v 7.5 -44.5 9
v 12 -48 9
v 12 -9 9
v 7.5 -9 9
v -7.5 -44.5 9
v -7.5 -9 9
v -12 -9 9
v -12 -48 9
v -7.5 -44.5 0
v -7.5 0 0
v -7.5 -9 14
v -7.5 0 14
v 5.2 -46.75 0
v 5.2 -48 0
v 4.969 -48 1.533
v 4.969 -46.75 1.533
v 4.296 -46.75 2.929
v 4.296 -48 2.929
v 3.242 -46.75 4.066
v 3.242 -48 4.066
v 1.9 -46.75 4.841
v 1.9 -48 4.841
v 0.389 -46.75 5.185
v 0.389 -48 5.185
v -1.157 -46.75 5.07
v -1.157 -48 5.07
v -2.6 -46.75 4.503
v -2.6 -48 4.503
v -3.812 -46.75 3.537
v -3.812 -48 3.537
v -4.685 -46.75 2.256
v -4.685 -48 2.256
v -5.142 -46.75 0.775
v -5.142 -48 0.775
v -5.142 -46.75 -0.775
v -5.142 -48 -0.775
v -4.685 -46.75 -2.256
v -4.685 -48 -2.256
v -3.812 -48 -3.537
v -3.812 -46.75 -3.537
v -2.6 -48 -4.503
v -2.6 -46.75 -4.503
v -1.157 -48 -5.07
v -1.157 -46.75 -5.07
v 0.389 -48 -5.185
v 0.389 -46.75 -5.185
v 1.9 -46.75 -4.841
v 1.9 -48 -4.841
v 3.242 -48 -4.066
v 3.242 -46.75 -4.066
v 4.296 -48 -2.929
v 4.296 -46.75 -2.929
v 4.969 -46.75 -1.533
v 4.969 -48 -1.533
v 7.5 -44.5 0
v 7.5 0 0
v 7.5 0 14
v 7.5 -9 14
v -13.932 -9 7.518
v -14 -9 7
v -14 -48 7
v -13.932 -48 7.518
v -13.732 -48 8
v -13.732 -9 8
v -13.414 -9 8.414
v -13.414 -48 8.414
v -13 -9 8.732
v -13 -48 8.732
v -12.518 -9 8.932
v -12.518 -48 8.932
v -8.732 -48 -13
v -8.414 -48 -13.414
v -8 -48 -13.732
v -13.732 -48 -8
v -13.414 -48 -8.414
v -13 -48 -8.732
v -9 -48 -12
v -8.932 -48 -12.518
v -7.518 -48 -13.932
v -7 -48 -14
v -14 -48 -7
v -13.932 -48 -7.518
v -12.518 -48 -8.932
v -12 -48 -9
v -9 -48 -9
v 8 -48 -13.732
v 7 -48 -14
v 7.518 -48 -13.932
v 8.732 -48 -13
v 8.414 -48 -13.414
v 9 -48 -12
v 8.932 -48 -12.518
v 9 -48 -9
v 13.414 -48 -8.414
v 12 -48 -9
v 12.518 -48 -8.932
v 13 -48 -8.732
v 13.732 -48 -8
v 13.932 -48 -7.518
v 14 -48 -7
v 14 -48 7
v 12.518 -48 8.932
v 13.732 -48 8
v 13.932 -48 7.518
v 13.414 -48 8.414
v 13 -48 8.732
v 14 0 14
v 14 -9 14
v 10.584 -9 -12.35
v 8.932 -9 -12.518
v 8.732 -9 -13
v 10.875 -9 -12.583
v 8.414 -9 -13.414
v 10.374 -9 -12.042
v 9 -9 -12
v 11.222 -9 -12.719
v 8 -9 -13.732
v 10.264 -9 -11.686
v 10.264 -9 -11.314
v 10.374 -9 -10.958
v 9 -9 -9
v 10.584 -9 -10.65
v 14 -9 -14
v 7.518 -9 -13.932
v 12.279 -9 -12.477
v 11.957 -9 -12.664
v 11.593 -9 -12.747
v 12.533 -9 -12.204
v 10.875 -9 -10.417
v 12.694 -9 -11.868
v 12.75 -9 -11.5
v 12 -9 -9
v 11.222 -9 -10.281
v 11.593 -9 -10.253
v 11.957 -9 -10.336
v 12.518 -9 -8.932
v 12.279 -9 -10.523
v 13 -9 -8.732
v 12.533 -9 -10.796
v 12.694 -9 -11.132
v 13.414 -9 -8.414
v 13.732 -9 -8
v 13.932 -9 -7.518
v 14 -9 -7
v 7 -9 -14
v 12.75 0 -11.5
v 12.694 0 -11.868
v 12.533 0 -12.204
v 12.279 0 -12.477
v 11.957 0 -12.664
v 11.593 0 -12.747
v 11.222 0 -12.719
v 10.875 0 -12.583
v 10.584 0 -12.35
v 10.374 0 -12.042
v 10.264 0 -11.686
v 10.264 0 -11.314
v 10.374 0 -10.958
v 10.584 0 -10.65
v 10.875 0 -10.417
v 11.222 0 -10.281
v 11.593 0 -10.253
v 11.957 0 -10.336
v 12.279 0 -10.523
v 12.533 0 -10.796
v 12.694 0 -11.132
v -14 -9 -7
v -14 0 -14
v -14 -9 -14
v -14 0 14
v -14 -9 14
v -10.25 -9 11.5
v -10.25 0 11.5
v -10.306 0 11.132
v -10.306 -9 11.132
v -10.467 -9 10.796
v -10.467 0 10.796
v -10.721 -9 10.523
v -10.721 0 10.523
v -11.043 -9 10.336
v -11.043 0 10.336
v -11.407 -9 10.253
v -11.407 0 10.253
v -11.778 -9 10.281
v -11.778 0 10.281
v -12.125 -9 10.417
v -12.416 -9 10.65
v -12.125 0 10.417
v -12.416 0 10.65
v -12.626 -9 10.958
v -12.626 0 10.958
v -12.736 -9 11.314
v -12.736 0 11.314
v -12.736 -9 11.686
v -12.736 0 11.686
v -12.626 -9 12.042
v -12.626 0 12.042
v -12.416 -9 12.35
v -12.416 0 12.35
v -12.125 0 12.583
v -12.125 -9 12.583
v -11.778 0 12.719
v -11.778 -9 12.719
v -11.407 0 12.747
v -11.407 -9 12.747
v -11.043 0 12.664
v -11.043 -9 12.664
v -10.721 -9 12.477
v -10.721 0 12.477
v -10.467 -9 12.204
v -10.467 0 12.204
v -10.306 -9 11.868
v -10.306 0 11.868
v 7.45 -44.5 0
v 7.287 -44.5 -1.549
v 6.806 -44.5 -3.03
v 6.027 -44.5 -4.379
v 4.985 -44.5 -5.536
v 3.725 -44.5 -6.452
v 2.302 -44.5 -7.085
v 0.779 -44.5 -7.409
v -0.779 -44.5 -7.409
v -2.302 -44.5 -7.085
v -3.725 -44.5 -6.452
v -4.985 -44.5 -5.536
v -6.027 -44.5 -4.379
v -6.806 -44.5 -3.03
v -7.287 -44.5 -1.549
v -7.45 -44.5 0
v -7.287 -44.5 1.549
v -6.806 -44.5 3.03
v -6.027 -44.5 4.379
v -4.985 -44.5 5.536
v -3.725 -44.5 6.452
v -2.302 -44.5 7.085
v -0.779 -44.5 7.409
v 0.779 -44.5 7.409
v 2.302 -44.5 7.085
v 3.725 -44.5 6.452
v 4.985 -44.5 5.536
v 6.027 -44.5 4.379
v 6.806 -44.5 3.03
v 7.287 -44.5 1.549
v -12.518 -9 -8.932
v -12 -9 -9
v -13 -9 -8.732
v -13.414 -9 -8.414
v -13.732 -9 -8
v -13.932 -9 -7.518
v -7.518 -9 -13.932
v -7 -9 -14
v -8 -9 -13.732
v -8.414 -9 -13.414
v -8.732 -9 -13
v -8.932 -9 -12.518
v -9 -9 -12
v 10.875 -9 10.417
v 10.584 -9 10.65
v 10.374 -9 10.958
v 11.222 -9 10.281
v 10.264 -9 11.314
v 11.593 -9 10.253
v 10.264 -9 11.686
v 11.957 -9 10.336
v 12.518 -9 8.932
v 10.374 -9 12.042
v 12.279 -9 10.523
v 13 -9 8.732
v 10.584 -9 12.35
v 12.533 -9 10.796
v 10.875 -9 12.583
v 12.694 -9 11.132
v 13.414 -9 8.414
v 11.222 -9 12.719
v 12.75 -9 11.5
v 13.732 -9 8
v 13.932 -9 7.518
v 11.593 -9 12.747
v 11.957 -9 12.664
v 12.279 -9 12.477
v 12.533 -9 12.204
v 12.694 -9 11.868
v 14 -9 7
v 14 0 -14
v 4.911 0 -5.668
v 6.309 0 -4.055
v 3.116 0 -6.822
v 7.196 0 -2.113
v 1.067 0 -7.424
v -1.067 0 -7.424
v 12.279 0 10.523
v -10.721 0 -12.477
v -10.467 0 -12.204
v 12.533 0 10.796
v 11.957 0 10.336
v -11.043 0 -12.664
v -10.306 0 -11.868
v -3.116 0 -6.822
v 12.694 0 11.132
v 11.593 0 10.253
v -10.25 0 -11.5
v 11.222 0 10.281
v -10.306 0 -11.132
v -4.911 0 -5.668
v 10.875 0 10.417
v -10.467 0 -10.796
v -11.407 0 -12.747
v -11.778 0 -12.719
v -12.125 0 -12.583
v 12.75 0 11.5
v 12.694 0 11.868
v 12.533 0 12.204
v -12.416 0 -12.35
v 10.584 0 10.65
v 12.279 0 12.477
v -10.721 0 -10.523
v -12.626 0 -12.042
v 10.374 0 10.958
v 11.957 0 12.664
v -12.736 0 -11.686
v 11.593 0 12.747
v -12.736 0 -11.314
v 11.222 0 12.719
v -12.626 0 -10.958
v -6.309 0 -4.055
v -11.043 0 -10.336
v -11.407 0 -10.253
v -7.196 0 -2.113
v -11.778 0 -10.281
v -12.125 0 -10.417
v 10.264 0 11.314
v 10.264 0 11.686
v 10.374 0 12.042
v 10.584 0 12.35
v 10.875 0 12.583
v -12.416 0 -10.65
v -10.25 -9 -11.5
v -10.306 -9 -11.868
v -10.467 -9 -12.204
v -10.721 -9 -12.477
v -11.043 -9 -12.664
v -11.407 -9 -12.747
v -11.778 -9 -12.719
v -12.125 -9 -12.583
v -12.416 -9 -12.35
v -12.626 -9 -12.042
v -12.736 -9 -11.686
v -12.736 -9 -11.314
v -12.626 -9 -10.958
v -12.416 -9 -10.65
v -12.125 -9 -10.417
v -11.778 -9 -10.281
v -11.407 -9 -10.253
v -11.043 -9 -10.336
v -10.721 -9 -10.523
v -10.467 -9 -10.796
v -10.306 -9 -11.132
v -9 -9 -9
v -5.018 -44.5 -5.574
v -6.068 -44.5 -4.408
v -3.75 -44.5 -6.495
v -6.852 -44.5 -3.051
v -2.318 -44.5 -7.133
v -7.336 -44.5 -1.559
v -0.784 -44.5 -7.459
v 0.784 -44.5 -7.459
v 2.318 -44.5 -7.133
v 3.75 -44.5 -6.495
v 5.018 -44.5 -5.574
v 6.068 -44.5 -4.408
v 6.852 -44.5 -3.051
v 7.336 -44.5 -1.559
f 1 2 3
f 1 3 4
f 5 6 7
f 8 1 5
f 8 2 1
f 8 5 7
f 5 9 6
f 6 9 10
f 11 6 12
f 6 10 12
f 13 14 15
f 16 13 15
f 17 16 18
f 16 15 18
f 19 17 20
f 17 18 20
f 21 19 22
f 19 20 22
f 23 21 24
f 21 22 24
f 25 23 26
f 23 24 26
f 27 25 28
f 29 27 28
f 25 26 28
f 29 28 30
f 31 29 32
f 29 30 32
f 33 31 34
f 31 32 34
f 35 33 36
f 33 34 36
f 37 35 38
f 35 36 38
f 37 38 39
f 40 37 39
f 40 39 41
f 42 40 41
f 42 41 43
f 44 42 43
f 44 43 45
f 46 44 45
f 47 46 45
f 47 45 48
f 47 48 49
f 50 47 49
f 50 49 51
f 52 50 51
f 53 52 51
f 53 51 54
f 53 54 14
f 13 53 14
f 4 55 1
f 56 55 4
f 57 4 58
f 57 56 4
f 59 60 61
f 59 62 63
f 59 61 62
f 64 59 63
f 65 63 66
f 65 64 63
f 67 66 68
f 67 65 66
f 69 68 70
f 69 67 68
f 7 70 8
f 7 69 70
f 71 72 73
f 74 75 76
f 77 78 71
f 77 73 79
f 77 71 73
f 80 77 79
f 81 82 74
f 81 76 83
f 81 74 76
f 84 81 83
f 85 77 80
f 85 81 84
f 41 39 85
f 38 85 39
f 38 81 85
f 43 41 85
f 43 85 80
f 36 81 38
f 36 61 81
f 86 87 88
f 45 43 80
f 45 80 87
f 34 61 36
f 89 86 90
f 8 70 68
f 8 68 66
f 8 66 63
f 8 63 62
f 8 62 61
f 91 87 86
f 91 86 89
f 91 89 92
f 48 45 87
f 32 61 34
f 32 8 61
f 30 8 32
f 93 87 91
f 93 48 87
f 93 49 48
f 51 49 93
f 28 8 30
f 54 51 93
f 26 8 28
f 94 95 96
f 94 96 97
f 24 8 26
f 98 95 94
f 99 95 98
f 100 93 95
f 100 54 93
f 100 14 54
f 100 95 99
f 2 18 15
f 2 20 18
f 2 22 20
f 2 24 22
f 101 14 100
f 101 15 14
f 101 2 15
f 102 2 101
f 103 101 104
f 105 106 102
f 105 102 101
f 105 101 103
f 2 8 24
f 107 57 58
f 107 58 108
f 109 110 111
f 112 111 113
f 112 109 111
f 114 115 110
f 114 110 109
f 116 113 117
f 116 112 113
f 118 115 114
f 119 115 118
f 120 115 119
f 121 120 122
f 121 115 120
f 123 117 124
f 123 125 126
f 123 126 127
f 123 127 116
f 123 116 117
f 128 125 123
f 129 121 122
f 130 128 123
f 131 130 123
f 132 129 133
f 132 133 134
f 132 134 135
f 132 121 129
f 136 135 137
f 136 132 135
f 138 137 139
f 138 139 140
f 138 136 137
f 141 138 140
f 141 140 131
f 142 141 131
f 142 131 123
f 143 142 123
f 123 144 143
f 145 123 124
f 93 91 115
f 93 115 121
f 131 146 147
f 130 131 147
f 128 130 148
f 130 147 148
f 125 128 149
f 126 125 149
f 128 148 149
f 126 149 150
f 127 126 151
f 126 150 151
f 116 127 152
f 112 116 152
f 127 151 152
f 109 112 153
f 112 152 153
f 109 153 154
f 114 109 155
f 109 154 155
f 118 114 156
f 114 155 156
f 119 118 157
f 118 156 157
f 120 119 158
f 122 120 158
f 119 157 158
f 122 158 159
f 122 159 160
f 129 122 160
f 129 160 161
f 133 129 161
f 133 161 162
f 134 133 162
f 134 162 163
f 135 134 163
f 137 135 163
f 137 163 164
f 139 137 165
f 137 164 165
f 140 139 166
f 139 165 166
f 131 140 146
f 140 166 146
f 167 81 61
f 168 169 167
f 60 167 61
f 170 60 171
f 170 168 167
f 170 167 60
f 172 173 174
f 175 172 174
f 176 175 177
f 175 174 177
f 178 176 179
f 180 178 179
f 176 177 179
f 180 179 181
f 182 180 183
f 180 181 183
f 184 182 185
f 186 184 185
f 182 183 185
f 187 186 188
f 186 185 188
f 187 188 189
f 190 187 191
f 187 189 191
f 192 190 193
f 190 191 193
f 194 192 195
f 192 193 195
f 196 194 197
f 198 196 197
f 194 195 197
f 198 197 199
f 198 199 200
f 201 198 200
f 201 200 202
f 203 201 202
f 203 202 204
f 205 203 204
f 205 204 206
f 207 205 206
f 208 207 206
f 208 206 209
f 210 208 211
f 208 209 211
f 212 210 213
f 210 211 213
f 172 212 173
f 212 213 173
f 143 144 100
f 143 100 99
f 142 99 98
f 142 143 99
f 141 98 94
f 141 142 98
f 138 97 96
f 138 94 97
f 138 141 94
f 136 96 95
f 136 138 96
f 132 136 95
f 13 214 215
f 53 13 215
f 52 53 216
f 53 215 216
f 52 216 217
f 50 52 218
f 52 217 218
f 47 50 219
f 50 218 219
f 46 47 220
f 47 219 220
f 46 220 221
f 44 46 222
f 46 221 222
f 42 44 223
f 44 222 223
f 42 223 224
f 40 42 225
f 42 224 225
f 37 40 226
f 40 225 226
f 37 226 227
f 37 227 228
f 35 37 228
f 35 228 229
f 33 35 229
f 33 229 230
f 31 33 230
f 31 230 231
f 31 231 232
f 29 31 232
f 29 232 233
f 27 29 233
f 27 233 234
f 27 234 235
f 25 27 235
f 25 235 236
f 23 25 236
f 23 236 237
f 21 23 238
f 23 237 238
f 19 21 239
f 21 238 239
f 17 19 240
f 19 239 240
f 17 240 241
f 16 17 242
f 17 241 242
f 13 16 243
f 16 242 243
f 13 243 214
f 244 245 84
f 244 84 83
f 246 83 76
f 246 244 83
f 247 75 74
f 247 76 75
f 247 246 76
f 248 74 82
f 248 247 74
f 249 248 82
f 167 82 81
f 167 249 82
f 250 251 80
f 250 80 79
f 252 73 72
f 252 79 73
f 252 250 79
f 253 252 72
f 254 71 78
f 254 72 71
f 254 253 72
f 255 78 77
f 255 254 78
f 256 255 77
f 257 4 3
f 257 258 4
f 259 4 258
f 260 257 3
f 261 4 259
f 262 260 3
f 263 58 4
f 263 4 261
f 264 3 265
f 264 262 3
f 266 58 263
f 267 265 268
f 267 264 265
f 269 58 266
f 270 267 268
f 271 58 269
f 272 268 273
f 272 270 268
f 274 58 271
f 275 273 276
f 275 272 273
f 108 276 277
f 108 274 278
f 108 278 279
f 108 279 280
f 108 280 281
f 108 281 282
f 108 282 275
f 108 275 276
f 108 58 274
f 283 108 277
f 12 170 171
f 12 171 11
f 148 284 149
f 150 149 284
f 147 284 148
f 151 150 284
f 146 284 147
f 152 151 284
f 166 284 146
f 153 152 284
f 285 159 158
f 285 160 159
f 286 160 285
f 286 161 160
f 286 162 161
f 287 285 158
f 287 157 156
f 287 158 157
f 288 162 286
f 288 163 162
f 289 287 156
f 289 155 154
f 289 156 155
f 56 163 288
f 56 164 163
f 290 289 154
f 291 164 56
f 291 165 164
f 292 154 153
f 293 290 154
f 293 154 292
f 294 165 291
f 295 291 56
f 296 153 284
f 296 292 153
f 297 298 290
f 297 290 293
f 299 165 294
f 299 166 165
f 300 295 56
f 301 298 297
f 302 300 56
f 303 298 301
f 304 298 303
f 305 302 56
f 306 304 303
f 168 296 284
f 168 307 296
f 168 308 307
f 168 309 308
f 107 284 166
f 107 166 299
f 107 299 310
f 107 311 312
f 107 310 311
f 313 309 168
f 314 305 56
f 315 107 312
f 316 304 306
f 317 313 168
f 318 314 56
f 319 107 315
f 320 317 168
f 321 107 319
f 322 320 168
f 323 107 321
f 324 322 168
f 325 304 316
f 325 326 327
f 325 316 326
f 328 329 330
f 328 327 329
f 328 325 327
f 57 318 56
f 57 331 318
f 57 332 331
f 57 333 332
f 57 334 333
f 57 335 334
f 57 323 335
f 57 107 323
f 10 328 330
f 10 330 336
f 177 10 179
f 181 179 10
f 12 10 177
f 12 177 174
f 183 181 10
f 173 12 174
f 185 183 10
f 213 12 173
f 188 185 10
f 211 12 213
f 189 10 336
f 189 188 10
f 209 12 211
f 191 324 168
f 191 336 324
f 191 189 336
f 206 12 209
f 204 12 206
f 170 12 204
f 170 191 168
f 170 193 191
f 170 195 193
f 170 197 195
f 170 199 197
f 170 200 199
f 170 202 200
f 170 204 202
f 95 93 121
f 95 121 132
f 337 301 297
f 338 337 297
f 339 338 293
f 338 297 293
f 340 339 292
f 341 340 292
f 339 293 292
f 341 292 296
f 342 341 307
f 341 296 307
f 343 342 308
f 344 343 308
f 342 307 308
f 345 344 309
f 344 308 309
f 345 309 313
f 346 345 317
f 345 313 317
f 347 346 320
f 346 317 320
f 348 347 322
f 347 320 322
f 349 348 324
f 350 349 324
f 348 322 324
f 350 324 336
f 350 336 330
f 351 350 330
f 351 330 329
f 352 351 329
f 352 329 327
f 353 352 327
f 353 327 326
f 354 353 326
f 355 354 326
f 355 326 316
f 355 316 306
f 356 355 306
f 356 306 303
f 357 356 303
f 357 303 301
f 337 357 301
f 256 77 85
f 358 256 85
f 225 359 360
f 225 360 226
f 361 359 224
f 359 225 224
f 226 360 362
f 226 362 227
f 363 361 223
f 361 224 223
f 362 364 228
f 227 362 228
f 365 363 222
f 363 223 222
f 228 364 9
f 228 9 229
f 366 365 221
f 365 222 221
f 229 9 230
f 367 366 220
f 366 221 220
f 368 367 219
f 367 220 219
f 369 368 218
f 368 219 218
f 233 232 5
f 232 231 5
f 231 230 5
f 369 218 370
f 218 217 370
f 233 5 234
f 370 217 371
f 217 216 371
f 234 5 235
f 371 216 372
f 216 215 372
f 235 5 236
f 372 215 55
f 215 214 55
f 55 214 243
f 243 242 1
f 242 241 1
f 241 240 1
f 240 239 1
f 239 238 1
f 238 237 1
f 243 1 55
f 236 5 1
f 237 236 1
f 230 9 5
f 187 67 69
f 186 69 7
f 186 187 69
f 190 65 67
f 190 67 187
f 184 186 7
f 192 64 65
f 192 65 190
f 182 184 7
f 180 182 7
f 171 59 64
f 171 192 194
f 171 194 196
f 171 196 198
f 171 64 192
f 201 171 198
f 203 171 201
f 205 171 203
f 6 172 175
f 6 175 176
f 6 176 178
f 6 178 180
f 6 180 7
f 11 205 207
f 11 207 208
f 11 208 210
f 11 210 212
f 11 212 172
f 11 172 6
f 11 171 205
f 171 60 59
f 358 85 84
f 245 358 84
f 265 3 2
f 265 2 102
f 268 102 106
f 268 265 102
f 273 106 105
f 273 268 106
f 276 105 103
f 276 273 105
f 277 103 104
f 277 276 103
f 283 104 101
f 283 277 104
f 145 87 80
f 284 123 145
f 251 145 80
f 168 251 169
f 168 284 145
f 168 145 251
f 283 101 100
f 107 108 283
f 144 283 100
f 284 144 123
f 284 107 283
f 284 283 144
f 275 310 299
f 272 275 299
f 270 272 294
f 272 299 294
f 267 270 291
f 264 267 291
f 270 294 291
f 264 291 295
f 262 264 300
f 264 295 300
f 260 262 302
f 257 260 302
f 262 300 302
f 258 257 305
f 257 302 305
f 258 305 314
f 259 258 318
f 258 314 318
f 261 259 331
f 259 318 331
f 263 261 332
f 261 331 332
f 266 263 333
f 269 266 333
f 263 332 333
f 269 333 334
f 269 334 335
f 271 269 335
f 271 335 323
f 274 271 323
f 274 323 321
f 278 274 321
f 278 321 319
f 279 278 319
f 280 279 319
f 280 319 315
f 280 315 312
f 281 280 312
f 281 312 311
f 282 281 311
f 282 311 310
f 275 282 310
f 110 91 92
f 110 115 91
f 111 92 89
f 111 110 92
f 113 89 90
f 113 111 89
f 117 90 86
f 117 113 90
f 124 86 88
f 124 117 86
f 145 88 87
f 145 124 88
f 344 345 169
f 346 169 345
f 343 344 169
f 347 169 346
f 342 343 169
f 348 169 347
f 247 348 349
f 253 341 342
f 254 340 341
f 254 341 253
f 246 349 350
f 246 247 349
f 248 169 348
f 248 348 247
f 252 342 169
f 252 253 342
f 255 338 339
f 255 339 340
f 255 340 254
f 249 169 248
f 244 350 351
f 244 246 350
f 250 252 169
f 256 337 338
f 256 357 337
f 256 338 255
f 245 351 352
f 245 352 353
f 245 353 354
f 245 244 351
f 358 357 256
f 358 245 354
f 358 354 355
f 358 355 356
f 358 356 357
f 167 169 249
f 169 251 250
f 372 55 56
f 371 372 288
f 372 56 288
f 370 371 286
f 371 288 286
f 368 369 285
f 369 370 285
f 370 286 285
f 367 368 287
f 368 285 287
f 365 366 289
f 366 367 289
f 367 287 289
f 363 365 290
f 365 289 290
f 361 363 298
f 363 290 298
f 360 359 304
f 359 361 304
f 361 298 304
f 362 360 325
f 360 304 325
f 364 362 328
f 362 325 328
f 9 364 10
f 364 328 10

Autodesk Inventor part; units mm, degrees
ref_plane "YZ Plane" through (0, 0, 0) normal (1, 0, 0) x (0, 1, 0)
ref_plane "XZ Plane" through (0, 0, 0) normal (0, 1, 0) x (-1, 0, 0)
ref_plane "XY Plane" through (0, 0, 0) normal (0, 0, 1) x (1, 0, 0)
sketch "Skizze1" plane through (0, 0, 0) normal (0, 1, 0) x (-1, 0, 0)
  arc A0 (-7.5, 0) -> (7.5, 0) centre (0, 0) ccw
  line L0 (-14, 14) -> (-14, -14)
  line L1 (-14, -14) -> (14, -14)
  line L2 (14, -14) -> (14, 14)
  line L3 (7.5, 0) -> (7.5, 14)
  line L4 (-7.5, 0) -> (-7.5, 14)
  line L5 (14, 14) -> (7.5, 14)
  line L6 (-7.5, 14) -> (-14, 14)
  dimension "d0" = 15
  dimension "d1" = 28
  dimension "d2" = 28
  dimension "d3" = 14
  dimension "d4" = 14
extrude "Extrusion1" add sketch "Skizze1" against normal blind 49.5
sketch "Skizze2" plane through (0, -49.5, 0) normal (0, -1, 0) x (1, 0, 0)
  line L0 (-14, 14) -> (-14, -14) projected
  line L1 (-14, -14) -> (14, -14) projected
  line L2 (14, -14) -> (14, 14) projected
  line L3 (14, 14) -> (7.5, 14) projected
  line L4 (7.5, 14) -> (7.5, 0) projected
  arc A0 (-7.5, 0) -> (7.5, 0) centre (0, 0) ccw projected
  line L5 (-7.5, 0) -> (-7.5, 14) projected
  line L6 (-7.5, 14) -> (-14, 14) projected
  line L7 (-7.5, 0) -> (-7.5, 14) projected
  line L8 (-7.5, 14) -> (7.5, 14)
  circle A1 centre (0, 0) radius 5.2
  dimension "d7" = 10.4
extrude "Extrusion2" add sketch "Skizze2" against normal blind 5 contours L8 L4 A0 L5
chamfer "Fase1" distance 2.25 angle 45 1 edges at (-5.2, -44.5, 0)
sketch "Skizze5" plane through (0, 0, 0) normal (0, 1, 0) x (1, 0, 0)
  circle A0 centre (-11.5, -11.5) radius 1.25
  line L0 (-14, -14) -> (-14, 14) projected
  line L1 (-7.5, -14) -> (-14, -14) projected
  line L2 (-7.5, 0) -> (-7.5, -14) projected
  arc A1 (7.5, 0) -> (-7.5, 0) centre (0, 0) ccw projected
  line L3 (7.5, -14) -> (7.5, 0) projected
  line L4 (14, -14) -> (7.5, -14) projected
  line L5 (14, 14) -> (14, -14) projected
  line L6 (-14, 14) -> (14, 14) projected
  circle A2 centre (11.5, -11.5) radius 1.25
  circle A3 centre (-11.5, 11.5) radius 1.25
  circle A4 centre (11.5, 11.5) radius 1.25
  dimension "d21" = 2.5
  dimension "d22" = 2.5
  dimension "d23" = 2.5
  dimension "d26" = 23
  dimension "d29" = 23
extrude "Extrusion5" cut sketch "Skizze5" against normal blind 50 contours A0 | A2 | A3 | A4
sketch "Skizze7" plane through (0, -49.5, 0) normal (0, -1, 0) x (1, 0, 0)
  circle A0 centre (-11.5, 11.5) radius 1.25 projected
  circle A1 centre (0, 0) radius 5.2 projected
  line L0 (-14, 14) -> (-14, -14) projected
  line L1 (-14, -14) -> (14, -14) projected
  line L2 (14, -14) -> (14, 14) projected
  line L3 (14, 14) -> (-14, 14) projected
  circle A2 centre (11.5, 11.5) radius 1.25 projected
  circle A3 centre (11.5, -11.5) radius 1.25 projected
  circle A4 centre (-11.5, -11.5) radius 1.25 projected
  line L4 (14, -14) -> (14, 14) projected
  line L5 (14, 14) -> (9, 14)
  line L6 (9, 14) -> (9, 9)
  line L7 (9, 9) -> (14, 9)
  line L8 (14, 9) -> (14, 14)
  line L9 (-14, 14) -> (-9, 14)
  line L10 (-9, 14) -> (-9, 9)
  line L11 (-9, 9) -> (-14, 9)
  line L12 (-14, 9) -> (-14, 14)
  line L13 (-14, -14) -> (-9, -14)
  line L14 (-9, -14) -> (-9, -9)
  line L15 (-9, -9) -> (-14, -9)
  line L16 (-14, -9) -> (-14, -14)
  line L17 (14, -14) -> (9, -14)
  line L18 (9, -14) -> (9, -9)
  line L19 (9, -9) -> (14, -9)
  line L20 (14, -9) -> (14, -14)
  line L21 (9, 9) -> (-9, 9)
  line L22 (-9, 9) -> (-9, 14)
  line L23 (-9, 14) -> (9, 14)
  line L24 (9, 14) -> (9, 9)
  dimension "d45" = 5
  dimension "d46" = 5
  dimension "d47" = 5
  dimension "d48" = 5
  dimension "d49" = 5
  dimension "d50" = 5
extrude "Extrusion7" cut sketch "Skizze7" against normal blind 40.5 contours A0 | L3 L10 L11 L0 | L3 L6 L21 L10 | L15 L14 L1 L0 | L3 L2 L7 L6 | L18 L19 L2 L1 | A2 | A3 | A4
fillet "Rundung3" radius 2 6 edges at (14, -29.25, 9) (14, -29.25, -9) (-14, -29.25, 9) (9, -29.25, -14) (-9, -29.25, -14) (-14, -29.25, -9)
sketch "Skizze8" plane through (0, -49.5, 0) normal (0, -1, 0) x (1, 0, 0)
  circle A0 centre (0, 0) radius 5.2 projected
  arc A1 (-14, -7) -> (-12, -9) centre (-12, -7) ccw projected
  line L0 (-12, -9) -> (-9, -9) projected
  line L1 (-9, -9) -> (-9, -12) projected
  arc A2 (-9, -12) -> (-7, -14) centre (-7, -12) ccw projected
  line L2 (-7, -14) -> (7, -14) projected
  arc A3 (7, -14) -> (9, -12) centre (7, -12) ccw projected
  line L3 (9, -12) -> (9, -9) projected
  line L4 (9, -9) -> (12, -9) projected
  arc A4 (12, -9) -> (14, -7) centre (12, -7) ccw projected
  line L5 (14, -7) -> (14, 7) projected
  arc A5 (14, 7) -> (12, 9) centre (12, 7) ccw projected
  line L6 (12, 9) -> (-12, 9) projected
  arc A6 (-12, 9) -> (-14, 7) centre (-12, 7) ccw projected
  line L7 (-14, 7) -> (-14, -7) projected
extrude "Extrusion8" cut sketch "Skizze8" against normal blind 1.5
properties part number "Lower_Unit"
